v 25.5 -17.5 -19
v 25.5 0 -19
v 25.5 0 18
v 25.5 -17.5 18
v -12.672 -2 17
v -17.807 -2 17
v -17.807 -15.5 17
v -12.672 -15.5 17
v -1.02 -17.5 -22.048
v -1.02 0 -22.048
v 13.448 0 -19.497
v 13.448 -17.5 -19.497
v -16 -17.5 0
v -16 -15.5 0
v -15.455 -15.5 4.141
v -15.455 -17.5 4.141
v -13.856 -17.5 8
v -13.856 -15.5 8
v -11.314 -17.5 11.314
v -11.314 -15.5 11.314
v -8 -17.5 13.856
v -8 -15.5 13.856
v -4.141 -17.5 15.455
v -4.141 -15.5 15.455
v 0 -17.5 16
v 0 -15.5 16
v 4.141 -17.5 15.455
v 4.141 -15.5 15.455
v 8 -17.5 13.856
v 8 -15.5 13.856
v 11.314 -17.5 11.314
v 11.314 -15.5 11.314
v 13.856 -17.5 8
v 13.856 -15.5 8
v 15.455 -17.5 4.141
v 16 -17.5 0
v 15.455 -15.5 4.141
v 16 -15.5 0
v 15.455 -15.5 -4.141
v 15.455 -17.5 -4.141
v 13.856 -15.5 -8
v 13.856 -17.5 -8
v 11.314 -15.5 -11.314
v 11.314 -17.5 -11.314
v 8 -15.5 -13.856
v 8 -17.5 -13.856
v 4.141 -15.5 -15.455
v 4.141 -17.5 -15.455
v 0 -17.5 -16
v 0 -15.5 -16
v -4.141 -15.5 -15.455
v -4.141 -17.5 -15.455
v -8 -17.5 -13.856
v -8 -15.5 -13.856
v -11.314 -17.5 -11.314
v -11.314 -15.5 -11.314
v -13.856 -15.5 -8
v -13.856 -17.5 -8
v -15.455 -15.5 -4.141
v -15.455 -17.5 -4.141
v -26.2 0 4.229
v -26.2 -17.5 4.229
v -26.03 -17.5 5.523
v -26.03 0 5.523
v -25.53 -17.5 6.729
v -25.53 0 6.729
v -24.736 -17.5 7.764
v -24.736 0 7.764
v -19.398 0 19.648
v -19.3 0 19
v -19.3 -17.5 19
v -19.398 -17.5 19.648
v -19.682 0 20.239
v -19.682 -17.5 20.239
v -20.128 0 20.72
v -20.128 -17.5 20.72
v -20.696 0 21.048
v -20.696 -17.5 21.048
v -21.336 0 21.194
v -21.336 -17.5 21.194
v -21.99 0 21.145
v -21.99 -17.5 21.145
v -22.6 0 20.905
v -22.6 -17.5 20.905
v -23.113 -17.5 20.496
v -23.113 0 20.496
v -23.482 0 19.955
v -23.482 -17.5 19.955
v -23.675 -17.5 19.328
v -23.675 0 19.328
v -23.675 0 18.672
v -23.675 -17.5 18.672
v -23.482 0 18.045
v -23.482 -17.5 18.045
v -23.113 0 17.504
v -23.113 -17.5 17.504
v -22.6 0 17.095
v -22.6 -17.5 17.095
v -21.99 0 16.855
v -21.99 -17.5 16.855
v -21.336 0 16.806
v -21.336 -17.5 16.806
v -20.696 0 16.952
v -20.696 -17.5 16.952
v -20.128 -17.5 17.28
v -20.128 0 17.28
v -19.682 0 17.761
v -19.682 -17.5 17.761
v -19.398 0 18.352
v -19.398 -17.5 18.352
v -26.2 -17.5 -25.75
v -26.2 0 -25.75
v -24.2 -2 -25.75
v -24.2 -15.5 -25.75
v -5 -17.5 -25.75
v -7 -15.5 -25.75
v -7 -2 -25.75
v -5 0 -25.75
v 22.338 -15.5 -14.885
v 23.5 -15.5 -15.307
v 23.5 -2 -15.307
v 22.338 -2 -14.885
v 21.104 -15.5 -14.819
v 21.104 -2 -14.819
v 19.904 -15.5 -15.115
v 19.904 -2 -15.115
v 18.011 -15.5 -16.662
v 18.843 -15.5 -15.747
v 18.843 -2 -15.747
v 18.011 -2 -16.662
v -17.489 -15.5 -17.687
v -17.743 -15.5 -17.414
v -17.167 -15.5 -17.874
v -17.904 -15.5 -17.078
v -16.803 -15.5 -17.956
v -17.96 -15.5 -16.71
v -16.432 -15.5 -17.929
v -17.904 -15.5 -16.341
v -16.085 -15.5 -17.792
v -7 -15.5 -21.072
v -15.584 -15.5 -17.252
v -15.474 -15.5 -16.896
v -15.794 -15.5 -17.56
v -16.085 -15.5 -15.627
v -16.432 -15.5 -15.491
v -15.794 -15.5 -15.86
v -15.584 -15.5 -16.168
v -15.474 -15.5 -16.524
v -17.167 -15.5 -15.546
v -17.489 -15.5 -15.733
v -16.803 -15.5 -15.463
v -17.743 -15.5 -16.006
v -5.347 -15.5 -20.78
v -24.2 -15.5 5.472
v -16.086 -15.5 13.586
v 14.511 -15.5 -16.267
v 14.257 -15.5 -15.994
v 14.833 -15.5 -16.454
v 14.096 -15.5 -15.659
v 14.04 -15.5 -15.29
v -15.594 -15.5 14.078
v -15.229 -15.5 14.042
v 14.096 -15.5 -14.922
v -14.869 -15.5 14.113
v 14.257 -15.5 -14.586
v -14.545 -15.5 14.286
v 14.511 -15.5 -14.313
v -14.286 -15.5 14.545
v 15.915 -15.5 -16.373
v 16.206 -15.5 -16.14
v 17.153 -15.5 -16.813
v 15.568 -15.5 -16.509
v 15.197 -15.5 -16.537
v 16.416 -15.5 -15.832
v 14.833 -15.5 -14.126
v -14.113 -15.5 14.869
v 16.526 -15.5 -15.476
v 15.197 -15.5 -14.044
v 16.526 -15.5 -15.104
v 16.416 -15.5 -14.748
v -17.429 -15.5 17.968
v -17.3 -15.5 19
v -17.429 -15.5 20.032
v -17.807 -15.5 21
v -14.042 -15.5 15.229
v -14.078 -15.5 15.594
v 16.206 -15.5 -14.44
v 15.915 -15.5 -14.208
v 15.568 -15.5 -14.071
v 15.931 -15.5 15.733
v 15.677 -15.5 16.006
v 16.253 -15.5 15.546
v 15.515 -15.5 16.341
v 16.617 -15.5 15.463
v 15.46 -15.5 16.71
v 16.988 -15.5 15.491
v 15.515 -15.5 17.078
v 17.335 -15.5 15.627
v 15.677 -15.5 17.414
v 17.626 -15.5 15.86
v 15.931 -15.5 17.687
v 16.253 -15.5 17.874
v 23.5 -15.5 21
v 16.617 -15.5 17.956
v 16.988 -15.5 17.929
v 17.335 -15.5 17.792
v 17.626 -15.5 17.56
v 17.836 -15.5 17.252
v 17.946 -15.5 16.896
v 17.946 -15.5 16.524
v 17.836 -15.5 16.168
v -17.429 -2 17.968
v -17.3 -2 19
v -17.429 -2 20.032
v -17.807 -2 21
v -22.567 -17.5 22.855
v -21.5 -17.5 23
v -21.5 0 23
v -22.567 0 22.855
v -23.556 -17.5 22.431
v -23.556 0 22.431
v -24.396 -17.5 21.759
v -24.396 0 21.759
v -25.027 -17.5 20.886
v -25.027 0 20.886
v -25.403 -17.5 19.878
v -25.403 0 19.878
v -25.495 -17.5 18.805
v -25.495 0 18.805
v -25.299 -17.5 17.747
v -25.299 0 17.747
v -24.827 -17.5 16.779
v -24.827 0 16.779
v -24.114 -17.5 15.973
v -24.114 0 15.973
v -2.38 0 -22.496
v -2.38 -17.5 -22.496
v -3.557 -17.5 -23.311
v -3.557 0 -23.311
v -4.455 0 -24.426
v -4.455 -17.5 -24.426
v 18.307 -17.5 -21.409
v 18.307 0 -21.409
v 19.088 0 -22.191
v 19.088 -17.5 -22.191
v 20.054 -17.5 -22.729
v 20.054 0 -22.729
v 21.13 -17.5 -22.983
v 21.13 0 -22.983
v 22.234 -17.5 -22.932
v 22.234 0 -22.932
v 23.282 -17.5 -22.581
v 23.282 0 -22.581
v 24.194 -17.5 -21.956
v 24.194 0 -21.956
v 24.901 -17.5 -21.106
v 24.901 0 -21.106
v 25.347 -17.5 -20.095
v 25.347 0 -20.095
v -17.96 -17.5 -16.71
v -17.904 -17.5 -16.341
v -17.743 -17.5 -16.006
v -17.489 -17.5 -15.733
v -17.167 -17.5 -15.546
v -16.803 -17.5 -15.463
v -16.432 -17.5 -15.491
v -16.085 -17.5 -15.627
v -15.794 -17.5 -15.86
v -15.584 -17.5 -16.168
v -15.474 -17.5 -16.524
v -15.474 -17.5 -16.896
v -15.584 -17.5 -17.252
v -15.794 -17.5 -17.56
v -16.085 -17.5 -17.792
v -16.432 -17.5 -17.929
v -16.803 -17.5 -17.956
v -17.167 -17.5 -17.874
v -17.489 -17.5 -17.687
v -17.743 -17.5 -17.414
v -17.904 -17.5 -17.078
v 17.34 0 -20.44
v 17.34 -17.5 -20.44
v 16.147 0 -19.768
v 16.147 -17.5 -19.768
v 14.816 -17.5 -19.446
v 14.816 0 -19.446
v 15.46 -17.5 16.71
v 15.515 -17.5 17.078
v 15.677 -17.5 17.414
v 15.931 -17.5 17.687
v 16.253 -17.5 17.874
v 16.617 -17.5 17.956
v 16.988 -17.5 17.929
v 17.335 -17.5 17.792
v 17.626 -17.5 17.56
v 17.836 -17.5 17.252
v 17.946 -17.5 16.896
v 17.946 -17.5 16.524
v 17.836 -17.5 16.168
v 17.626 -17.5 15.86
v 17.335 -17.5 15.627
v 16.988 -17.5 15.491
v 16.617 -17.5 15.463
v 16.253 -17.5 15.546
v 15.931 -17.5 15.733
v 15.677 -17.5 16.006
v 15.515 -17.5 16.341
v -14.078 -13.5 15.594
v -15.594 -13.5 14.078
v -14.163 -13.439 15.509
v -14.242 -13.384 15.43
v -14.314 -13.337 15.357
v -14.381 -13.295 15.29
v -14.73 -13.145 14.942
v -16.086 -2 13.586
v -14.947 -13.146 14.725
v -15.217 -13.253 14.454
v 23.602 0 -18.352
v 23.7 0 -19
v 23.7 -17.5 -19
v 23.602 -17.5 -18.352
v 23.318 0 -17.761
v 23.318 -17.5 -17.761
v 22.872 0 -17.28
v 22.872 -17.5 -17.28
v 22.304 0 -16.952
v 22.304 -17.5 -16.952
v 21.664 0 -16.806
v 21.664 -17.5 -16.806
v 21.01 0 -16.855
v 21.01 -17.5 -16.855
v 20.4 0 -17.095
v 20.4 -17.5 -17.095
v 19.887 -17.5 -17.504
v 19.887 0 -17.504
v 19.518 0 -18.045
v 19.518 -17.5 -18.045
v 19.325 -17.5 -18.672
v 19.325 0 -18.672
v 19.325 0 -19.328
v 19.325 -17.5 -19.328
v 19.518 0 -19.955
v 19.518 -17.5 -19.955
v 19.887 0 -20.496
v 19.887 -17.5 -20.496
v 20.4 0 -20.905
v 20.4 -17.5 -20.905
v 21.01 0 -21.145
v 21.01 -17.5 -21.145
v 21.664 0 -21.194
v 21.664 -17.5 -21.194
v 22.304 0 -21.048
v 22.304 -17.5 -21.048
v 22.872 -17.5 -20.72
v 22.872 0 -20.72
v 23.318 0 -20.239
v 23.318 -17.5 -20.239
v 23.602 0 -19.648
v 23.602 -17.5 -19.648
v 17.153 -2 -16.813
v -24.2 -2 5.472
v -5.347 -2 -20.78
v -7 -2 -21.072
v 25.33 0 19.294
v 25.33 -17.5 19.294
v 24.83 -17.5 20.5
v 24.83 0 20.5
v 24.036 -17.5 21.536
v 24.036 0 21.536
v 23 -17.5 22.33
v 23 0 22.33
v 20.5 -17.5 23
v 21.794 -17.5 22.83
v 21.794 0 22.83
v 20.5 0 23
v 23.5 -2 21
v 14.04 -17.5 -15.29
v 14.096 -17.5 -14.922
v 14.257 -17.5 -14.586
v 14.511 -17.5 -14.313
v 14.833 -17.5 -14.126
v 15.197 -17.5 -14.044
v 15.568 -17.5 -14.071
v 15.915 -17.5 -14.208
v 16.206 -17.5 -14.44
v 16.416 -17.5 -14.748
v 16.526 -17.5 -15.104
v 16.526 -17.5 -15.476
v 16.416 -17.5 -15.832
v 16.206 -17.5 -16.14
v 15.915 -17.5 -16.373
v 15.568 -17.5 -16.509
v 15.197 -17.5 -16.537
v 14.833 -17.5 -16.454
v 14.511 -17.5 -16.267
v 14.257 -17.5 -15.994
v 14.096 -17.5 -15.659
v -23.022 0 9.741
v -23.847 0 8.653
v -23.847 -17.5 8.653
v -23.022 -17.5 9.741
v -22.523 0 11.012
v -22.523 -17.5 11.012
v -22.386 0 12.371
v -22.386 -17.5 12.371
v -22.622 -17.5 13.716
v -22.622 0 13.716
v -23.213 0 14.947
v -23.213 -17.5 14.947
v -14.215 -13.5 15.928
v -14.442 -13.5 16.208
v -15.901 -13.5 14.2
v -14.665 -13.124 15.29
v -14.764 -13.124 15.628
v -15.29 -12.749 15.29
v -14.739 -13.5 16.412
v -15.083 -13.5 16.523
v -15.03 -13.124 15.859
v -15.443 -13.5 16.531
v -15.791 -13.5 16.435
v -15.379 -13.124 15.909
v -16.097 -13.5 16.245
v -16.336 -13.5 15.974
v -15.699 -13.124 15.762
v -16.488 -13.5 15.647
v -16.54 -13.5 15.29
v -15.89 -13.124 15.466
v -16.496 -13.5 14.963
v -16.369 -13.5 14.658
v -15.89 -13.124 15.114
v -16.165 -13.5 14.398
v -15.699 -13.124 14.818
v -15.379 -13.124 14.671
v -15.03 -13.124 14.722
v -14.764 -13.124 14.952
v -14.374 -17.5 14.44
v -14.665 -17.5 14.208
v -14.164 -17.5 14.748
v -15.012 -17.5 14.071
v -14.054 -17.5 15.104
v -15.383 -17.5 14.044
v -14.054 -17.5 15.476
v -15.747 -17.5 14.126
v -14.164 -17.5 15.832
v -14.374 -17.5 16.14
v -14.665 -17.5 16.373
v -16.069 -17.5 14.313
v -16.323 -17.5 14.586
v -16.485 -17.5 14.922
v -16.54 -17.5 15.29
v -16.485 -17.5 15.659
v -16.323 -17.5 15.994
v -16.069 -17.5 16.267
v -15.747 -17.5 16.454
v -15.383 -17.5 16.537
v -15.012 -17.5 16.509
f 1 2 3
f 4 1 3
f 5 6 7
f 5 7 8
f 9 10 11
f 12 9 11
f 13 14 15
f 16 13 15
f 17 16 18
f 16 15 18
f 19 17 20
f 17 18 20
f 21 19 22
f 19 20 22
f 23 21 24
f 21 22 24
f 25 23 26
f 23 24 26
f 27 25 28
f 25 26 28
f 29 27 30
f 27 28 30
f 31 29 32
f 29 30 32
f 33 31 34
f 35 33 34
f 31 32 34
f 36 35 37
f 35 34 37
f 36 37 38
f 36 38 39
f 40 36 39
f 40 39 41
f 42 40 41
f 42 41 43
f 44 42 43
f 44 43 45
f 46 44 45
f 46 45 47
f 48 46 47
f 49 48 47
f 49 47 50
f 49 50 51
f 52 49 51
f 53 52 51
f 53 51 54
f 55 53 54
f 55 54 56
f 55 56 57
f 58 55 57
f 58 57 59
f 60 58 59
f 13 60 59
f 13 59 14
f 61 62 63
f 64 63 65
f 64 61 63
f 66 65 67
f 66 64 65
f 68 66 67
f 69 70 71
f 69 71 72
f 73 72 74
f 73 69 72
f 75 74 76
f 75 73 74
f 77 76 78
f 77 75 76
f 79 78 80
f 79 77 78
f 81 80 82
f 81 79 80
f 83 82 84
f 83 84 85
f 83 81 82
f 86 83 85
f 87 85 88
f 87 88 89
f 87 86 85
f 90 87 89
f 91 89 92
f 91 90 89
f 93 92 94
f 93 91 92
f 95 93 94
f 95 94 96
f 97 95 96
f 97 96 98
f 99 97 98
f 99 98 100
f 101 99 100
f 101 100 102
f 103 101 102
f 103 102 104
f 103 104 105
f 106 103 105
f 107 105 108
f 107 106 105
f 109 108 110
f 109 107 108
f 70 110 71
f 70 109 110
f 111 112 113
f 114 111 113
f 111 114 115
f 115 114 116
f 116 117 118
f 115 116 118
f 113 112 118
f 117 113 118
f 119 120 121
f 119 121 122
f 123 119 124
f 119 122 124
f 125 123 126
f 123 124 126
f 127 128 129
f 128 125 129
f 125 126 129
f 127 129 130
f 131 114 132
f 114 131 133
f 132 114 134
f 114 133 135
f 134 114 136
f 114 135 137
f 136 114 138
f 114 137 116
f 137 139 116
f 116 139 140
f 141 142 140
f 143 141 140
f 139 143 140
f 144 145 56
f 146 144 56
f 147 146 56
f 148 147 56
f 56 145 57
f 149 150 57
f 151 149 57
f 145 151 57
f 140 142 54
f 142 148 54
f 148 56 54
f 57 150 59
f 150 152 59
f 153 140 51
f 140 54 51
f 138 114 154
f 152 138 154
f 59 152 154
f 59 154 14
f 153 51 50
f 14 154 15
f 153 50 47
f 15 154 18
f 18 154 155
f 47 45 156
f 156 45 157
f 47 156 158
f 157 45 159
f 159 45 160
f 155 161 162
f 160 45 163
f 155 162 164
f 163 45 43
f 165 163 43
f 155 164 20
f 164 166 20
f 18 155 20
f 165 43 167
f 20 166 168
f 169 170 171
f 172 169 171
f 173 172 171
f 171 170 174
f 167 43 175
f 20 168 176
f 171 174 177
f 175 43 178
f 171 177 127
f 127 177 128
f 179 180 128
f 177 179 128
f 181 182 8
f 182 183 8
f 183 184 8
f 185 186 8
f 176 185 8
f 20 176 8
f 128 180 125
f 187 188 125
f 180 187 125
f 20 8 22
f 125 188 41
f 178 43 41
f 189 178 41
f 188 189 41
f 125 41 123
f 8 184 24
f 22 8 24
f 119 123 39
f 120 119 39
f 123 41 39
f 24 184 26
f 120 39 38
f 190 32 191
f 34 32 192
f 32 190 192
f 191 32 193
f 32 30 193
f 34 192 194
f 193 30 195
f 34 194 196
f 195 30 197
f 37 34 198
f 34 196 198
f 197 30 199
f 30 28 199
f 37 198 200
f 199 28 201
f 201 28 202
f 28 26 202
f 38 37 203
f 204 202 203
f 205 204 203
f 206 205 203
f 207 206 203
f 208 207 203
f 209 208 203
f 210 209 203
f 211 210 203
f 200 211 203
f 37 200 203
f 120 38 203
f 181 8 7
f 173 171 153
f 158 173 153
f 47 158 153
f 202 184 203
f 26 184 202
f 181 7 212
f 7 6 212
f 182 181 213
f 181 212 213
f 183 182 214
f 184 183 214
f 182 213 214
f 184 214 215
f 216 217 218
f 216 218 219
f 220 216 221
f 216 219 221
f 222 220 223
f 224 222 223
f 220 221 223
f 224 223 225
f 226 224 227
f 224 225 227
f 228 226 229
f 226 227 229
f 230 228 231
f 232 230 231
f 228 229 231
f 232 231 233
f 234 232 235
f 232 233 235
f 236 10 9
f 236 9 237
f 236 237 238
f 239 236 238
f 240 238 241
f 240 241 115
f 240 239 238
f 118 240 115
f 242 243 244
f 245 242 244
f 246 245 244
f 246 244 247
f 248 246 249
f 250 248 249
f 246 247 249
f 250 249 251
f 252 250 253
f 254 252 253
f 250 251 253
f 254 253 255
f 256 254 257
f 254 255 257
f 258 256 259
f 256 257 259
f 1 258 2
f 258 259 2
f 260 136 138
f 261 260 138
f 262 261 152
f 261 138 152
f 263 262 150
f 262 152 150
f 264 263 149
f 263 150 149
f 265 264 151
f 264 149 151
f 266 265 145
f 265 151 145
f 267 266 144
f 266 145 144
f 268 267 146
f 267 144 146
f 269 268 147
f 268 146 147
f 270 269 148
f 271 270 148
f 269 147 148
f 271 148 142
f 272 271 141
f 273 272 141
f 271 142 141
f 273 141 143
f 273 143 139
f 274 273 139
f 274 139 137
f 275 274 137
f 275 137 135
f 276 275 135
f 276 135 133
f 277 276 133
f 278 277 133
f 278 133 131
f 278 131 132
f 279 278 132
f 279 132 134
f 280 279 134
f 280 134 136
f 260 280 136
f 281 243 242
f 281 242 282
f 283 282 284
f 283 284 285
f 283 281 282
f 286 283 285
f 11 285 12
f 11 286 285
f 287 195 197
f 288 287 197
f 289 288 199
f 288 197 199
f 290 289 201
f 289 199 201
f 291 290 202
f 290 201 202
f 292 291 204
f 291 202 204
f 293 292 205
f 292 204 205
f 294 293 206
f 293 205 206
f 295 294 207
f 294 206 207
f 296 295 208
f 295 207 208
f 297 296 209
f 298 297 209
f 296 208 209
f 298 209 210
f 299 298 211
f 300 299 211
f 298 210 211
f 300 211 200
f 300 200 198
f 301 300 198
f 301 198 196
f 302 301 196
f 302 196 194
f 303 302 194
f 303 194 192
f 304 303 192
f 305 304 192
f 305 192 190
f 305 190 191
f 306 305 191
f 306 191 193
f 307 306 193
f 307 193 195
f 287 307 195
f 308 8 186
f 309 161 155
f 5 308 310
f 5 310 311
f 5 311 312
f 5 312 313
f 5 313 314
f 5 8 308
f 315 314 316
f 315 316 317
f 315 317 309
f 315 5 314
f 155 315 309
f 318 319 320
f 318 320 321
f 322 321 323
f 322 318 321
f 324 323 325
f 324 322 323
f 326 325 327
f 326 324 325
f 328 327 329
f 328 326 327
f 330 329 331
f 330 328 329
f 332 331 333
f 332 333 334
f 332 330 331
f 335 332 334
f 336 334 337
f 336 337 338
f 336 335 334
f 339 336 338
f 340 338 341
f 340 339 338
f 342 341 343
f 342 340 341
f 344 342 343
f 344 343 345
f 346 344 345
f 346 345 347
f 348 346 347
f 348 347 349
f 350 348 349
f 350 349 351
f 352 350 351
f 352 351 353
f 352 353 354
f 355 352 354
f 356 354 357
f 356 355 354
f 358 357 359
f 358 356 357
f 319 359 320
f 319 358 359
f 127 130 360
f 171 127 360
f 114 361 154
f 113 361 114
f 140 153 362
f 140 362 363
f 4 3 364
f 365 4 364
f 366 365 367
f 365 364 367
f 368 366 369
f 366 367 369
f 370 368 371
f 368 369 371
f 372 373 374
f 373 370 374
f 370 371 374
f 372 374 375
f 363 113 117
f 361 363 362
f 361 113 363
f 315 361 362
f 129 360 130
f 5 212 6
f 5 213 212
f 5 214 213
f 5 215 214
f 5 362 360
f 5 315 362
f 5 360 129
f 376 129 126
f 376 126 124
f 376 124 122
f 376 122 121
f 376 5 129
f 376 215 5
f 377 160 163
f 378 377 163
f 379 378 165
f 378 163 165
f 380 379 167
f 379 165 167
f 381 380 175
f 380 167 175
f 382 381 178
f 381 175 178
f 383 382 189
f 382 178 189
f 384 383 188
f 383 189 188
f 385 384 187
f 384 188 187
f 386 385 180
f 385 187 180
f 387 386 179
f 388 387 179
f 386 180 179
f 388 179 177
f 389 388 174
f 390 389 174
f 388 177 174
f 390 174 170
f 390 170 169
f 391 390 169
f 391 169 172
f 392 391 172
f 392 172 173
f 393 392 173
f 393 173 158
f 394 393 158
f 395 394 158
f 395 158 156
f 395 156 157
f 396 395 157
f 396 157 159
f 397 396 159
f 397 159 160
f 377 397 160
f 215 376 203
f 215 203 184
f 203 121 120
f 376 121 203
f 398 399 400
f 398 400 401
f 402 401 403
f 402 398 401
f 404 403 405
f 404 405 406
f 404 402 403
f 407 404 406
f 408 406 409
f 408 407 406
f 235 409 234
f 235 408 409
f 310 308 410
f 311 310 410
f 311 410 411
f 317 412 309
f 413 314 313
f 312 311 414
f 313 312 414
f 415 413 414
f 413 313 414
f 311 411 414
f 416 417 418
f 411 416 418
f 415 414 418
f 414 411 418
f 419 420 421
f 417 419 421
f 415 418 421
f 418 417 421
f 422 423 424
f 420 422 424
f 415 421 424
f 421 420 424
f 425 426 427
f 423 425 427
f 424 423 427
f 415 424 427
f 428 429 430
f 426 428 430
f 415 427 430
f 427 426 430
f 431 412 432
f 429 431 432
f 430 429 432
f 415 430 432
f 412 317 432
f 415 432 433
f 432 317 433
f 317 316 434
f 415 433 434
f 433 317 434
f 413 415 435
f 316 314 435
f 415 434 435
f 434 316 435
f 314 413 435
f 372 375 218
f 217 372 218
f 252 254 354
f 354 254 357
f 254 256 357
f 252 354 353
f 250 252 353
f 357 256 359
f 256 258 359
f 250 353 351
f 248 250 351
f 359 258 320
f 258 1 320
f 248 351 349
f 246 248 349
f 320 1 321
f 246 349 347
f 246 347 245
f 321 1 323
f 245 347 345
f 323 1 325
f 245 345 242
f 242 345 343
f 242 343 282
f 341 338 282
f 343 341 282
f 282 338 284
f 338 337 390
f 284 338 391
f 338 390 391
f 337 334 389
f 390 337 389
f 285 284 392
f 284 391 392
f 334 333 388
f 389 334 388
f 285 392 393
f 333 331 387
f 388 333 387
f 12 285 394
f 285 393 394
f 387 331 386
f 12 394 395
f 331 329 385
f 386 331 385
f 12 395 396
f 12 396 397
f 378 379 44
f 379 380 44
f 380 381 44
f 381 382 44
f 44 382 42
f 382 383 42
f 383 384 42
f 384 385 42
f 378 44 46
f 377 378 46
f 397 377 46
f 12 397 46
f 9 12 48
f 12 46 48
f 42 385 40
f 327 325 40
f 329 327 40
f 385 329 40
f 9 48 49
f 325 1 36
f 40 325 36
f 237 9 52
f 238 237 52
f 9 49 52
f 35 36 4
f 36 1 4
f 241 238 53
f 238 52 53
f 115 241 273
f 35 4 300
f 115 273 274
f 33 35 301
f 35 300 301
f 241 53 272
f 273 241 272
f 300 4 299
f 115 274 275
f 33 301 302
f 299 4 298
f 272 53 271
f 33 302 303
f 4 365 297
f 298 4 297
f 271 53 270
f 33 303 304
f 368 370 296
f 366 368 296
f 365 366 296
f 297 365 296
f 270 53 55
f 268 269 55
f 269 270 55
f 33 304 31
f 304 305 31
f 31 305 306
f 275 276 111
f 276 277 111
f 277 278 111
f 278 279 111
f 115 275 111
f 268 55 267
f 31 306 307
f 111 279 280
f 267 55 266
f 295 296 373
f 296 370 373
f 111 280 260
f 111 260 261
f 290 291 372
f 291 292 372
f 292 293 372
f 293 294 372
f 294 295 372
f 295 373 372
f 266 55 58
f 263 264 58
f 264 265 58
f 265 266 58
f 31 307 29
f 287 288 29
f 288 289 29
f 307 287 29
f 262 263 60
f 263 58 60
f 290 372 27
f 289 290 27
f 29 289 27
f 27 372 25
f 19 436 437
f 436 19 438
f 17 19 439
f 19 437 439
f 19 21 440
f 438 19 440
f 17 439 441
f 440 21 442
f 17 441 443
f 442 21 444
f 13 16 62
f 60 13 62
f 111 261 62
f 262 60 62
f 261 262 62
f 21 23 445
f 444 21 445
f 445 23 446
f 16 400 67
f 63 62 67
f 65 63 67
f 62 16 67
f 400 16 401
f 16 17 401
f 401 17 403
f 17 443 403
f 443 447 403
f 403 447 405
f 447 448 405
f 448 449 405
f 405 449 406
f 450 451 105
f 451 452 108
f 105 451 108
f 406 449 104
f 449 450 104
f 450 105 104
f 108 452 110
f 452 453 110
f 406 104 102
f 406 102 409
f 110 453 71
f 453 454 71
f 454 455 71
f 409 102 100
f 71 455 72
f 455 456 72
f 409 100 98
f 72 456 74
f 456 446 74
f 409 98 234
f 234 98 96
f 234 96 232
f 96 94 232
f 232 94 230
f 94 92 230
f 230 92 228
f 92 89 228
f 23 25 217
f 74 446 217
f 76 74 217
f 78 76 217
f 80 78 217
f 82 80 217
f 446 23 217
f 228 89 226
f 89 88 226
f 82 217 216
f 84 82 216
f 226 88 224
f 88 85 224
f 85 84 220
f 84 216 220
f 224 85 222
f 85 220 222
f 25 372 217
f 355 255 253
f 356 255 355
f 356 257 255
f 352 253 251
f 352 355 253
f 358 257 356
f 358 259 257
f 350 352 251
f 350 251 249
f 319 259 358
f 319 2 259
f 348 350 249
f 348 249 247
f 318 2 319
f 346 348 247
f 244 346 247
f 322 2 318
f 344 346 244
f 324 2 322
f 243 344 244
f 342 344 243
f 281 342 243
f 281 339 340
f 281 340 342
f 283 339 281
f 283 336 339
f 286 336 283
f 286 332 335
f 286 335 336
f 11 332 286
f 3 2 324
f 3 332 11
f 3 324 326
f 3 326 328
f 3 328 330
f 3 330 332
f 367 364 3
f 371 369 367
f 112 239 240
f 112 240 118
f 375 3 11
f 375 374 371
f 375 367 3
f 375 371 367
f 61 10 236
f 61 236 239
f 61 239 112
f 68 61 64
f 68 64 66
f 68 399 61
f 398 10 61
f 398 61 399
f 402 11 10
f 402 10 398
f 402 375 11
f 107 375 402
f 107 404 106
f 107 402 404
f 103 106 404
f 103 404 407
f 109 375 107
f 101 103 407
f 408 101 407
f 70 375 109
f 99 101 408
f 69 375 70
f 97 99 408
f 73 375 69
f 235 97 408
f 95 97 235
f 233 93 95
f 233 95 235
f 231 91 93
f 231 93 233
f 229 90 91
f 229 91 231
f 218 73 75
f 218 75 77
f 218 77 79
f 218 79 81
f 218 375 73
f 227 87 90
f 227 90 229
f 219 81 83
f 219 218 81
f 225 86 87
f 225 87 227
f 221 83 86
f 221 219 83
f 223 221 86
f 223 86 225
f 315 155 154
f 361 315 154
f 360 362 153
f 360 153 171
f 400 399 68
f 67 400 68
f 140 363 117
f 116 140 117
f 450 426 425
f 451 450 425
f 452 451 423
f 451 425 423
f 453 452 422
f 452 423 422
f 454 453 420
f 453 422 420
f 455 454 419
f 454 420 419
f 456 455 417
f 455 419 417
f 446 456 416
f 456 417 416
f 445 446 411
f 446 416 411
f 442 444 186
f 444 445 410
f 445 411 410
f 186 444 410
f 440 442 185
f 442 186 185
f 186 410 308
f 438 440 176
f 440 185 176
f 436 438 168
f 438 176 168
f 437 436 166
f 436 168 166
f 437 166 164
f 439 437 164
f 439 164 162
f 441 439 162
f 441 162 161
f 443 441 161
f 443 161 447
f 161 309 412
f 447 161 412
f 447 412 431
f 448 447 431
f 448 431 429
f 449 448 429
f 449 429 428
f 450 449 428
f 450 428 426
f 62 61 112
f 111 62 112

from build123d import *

# Parameters (mm, degrees)
F0_R        = 2.2
F1_DEPTH    = 17.5
F3_DEPTH    = 17.5
F4_T        = 2
F4_T3_DEPTH = 21.5
F5_T1_DEPTH = 17.5
F5_T3_DEPTH = 17.5
F5_T5_DEPTH = 17.5
F5_T7_DEPTH = 42.5
F5_T9_DEPTH = 27.8553390593
F7_D        = 32
F7_DEPTH    = 4
F7_TIP      = 9.6137699044
F8_D        = 2.5
F8_DEPTH    = 4
F8_TIP      = 0.7510757738


# Not quite as in the source:
# - a fillet or chamfer that OpenCascade refuses, or shapes differently, is made with other operations: its cross-section is extruded or revolved along the edge and cut away or added
# - a shell that OpenCascade refuses in one call is made with other operations: the cavity is built on its own and cut out


with BuildPart() as f1:
    # F0 (on Front) → F1 (new body)
    with BuildSketch(Plane.XZ):
        with BuildLine():
            Line((25.5, -19), (25.5, 23))
            Line((25.5, 23), (-21.5, 23))
            ThreePointArc((-21.5, 23), (-25.5, 19), (-21.5, 15))
            Line((-21.5, 15), (17.5, 15))
            Line((17.5, 15), (17.5, -19))
            ThreePointArc((17.5, -19), (21.5, -23), (25.5, -19))
        make_face()
        with Locations((21.5, -19)):
            Circle(F0_R, mode=Mode.SUBTRACT)
        with Locations((-21.5, 19)):
            Circle(F0_R, mode=Mode.SUBTRACT)
    extrude(amount=F1_DEPTH)

    # F2 (on Front) → F3 (join, through all)
    with BuildSketch(Plane.XZ):
        Polygon((17.5, -18.7826429341), (17.5, 15), (-17.5, 15), (-26.2, 6.3), (-26.2, -25.75), (-5, -25.75), (-5, -22.75), align=None)
    extrude(amount=F3_DEPTH)

    # F4: shell of thickness 2, made by hand


with BuildPart() as f4_core1:
    # F4_t2: copy of F1
    add(f1.part)

    # the walls: a layer under each face that stays
    f4_faces = [f4_core1.faces().sort_by_distance(p)[0] for p in [
        (25.5, -8.75, 2),
        (21.5, -8.75, -23),
        (2, -8.75, 23),
        (-0.35, 0, -1.375),
        (-0.35, -17.5, -1.375),
        (17.5, -8.75, -18.891321467),
        (-25.5, -8.75, 19),
        (-19.5, -8.75, 15),
        (19.3, -8.75, -19),
        (-23.7, -8.75, 19),
        (6.25, -8.75, -20.766321467),
        (-21.85, -8.75, 10.65),
        (-26.2, -8.75, -9.725),
        (-5, -8.75, -24.25),
    ]]
    thicken(f4_faces, amount=-F4_T, mode=Mode.SUBTRACT)

    # F4_s4 → F4_t3 (cut)
    with BuildSketch(Plane.XZ.offset(-2)):
        Polygon((17.4834729636, -18.8023390891), (19.5, -18.7826429341), (19.5, -16.3991357489), (17.1527036447, -16.813027428), align=None)
        Polygon((-17.5141421356, 14.9941421356), (-17.5, 17), (-12.6715728753, 17), (-16.0857864376, 13.5857864376), align=None)
        Polygon((-4.9765270364, -22.7696961551), (-5.3472963553, -20.780384494), (-7, -21.0718007376), (-7, -22.75), align=None)
    extrude(amount=F4_T3_DEPTH, mode=Mode.SUBTRACT)


with BuildPart() as f1_1:
    add(f1.part)

    # what is left inside the walls is the cavity
    f4_cavity = [f4_core1.part.solids().sort_by_distance(p)[0] for p in [
        (-0.35, -15.48, -10.166667),
    ]]
    add(f4_cavity, mode=Mode.SUBTRACT)

    # F5: fillet of radius 5 on 5 edges, made by hand

    # F5_s2 → F5_t1 (join)
    with BuildSketch(Plane.XZ):
        with BuildLine():
            ThreePointArc((18.307091383, -21.4094261897), (16.1468840352, -19.7684999194), (13.4477147235, -19.4971701618))
            Line((13.4477147235, -19.4971701618), (13.3608906347, -19.0047662853))
            Line((13.3608906347, -19.0047662853), (17.4131759112, -18.2902390576))
            Line((17.4131759112, -18.2902390576), (18, -18.7826429341))
            ThreePointArc((18, -18.7826429341), (18, -19), (18.7062049602, -21.108247916))
            Line((18.7062049602, -21.108247916), (18.307091383, -21.4094261897))
        make_face()
    extrude(amount=F5_T1_DEPTH)

    # F5_s4 → F5_t3 (join)
    with BuildSketch(Plane.XZ):
        with BuildLine():
            ThreePointArc((-23.8469891482, 8.6530108518), (-22.3858577587, 12.3711260424), (-24.1144546907, 15.972686559))
            Line((-24.1144546907, 15.972686559), (-23.7876478544, 16.3511007391))
            ThreePointArc((-23.7876478544, 16.3511007391), (-21.5, 15.5), (-17.5, 15.5))
            Line((-17.5, 15.5), (-17.1464466094, 14.6464466094))
            Line((-17.1464466094, 14.6464466094), (-23.4934357576, 8.2994574612))
            Line((-23.4934357576, 8.2994574612), (-23.8469891482, 8.6530108518))
        make_face()
    extrude(amount=F5_T3_DEPTH)

    # F5_s6 → F5_t5 (join)
    with BuildSketch(Plane.XZ):
        with BuildLine():
            ThreePointArc((-1.0199301517, -22.0482063006), (-3.5569146257, -23.311037583), (-5, -25.75))
            Line((-5, -25.75), (-5, -22.75))
            Line((-5, -22.75), (-1.0199301517, -22.0482063006))
        make_face()
    extrude(amount=F5_T5_DEPTH)

    # F5_s8 → F5_t7 (cut)
    with BuildSketch(Plane.XZ.offset(-12.5)):
        with BuildLine():
            ThreePointArc((25.5, 18), (24.0355339059, 21.5355339059), (20.5, 23))
            Line((20.5, 23), (25.5, 23))
            Line((25.5, 23), (25.5, 18))
        make_face()
    extrude(amount=F5_T7_DEPTH, mode=Mode.SUBTRACT)

    # F5_s10 → F5_t9 (cut)
    with BuildSketch(Plane.XZ.offset(-5.1776695297)):
        with BuildLine():
            ThreePointArc((-26.2, 4.2289321881), (-25.8193976626, 6.14234935), (-24.7355339059, 7.7644660941))
            Line((-24.7355339059, 7.7644660941), (-26.2, 6.3))
            Line((-26.2, 6.3), (-26.2, 4.2289321881))
        make_face()
    extrude(amount=F5_T9_DEPTH, mode=Mode.SUBTRACT)

    # F7
    with Locations(Plane.XZ.offset(17.5)):
        with Locations((0, 0)):
            Hole(F7_D / 2, depth=F7_DEPTH)
            with Locations((0, 0, -(F7_DEPTH + F7_TIP / 2))):  # 118° drill point
                Cone(0, F7_D / 2, F7_TIP, mode=Mode.SUBTRACT)

    # F8
    with Locations(Plane.XZ.offset(17.5)):
        with Locations((-15.2900823734, 15.2900823734), (-16.7099176266, -16.7099176266), (15.2900823734, -15.2900823734), (16.7099176266, 16.7099176266)):
            Hole(F8_D / 2, depth=F8_DEPTH)
            with Locations((0, 0, -(F8_DEPTH + F8_TIP / 2))):  # 118° drill point
                Cone(0, F8_D / 2, F8_TIP, mode=Mode.SUBTRACT)


solid = f1_1.part
